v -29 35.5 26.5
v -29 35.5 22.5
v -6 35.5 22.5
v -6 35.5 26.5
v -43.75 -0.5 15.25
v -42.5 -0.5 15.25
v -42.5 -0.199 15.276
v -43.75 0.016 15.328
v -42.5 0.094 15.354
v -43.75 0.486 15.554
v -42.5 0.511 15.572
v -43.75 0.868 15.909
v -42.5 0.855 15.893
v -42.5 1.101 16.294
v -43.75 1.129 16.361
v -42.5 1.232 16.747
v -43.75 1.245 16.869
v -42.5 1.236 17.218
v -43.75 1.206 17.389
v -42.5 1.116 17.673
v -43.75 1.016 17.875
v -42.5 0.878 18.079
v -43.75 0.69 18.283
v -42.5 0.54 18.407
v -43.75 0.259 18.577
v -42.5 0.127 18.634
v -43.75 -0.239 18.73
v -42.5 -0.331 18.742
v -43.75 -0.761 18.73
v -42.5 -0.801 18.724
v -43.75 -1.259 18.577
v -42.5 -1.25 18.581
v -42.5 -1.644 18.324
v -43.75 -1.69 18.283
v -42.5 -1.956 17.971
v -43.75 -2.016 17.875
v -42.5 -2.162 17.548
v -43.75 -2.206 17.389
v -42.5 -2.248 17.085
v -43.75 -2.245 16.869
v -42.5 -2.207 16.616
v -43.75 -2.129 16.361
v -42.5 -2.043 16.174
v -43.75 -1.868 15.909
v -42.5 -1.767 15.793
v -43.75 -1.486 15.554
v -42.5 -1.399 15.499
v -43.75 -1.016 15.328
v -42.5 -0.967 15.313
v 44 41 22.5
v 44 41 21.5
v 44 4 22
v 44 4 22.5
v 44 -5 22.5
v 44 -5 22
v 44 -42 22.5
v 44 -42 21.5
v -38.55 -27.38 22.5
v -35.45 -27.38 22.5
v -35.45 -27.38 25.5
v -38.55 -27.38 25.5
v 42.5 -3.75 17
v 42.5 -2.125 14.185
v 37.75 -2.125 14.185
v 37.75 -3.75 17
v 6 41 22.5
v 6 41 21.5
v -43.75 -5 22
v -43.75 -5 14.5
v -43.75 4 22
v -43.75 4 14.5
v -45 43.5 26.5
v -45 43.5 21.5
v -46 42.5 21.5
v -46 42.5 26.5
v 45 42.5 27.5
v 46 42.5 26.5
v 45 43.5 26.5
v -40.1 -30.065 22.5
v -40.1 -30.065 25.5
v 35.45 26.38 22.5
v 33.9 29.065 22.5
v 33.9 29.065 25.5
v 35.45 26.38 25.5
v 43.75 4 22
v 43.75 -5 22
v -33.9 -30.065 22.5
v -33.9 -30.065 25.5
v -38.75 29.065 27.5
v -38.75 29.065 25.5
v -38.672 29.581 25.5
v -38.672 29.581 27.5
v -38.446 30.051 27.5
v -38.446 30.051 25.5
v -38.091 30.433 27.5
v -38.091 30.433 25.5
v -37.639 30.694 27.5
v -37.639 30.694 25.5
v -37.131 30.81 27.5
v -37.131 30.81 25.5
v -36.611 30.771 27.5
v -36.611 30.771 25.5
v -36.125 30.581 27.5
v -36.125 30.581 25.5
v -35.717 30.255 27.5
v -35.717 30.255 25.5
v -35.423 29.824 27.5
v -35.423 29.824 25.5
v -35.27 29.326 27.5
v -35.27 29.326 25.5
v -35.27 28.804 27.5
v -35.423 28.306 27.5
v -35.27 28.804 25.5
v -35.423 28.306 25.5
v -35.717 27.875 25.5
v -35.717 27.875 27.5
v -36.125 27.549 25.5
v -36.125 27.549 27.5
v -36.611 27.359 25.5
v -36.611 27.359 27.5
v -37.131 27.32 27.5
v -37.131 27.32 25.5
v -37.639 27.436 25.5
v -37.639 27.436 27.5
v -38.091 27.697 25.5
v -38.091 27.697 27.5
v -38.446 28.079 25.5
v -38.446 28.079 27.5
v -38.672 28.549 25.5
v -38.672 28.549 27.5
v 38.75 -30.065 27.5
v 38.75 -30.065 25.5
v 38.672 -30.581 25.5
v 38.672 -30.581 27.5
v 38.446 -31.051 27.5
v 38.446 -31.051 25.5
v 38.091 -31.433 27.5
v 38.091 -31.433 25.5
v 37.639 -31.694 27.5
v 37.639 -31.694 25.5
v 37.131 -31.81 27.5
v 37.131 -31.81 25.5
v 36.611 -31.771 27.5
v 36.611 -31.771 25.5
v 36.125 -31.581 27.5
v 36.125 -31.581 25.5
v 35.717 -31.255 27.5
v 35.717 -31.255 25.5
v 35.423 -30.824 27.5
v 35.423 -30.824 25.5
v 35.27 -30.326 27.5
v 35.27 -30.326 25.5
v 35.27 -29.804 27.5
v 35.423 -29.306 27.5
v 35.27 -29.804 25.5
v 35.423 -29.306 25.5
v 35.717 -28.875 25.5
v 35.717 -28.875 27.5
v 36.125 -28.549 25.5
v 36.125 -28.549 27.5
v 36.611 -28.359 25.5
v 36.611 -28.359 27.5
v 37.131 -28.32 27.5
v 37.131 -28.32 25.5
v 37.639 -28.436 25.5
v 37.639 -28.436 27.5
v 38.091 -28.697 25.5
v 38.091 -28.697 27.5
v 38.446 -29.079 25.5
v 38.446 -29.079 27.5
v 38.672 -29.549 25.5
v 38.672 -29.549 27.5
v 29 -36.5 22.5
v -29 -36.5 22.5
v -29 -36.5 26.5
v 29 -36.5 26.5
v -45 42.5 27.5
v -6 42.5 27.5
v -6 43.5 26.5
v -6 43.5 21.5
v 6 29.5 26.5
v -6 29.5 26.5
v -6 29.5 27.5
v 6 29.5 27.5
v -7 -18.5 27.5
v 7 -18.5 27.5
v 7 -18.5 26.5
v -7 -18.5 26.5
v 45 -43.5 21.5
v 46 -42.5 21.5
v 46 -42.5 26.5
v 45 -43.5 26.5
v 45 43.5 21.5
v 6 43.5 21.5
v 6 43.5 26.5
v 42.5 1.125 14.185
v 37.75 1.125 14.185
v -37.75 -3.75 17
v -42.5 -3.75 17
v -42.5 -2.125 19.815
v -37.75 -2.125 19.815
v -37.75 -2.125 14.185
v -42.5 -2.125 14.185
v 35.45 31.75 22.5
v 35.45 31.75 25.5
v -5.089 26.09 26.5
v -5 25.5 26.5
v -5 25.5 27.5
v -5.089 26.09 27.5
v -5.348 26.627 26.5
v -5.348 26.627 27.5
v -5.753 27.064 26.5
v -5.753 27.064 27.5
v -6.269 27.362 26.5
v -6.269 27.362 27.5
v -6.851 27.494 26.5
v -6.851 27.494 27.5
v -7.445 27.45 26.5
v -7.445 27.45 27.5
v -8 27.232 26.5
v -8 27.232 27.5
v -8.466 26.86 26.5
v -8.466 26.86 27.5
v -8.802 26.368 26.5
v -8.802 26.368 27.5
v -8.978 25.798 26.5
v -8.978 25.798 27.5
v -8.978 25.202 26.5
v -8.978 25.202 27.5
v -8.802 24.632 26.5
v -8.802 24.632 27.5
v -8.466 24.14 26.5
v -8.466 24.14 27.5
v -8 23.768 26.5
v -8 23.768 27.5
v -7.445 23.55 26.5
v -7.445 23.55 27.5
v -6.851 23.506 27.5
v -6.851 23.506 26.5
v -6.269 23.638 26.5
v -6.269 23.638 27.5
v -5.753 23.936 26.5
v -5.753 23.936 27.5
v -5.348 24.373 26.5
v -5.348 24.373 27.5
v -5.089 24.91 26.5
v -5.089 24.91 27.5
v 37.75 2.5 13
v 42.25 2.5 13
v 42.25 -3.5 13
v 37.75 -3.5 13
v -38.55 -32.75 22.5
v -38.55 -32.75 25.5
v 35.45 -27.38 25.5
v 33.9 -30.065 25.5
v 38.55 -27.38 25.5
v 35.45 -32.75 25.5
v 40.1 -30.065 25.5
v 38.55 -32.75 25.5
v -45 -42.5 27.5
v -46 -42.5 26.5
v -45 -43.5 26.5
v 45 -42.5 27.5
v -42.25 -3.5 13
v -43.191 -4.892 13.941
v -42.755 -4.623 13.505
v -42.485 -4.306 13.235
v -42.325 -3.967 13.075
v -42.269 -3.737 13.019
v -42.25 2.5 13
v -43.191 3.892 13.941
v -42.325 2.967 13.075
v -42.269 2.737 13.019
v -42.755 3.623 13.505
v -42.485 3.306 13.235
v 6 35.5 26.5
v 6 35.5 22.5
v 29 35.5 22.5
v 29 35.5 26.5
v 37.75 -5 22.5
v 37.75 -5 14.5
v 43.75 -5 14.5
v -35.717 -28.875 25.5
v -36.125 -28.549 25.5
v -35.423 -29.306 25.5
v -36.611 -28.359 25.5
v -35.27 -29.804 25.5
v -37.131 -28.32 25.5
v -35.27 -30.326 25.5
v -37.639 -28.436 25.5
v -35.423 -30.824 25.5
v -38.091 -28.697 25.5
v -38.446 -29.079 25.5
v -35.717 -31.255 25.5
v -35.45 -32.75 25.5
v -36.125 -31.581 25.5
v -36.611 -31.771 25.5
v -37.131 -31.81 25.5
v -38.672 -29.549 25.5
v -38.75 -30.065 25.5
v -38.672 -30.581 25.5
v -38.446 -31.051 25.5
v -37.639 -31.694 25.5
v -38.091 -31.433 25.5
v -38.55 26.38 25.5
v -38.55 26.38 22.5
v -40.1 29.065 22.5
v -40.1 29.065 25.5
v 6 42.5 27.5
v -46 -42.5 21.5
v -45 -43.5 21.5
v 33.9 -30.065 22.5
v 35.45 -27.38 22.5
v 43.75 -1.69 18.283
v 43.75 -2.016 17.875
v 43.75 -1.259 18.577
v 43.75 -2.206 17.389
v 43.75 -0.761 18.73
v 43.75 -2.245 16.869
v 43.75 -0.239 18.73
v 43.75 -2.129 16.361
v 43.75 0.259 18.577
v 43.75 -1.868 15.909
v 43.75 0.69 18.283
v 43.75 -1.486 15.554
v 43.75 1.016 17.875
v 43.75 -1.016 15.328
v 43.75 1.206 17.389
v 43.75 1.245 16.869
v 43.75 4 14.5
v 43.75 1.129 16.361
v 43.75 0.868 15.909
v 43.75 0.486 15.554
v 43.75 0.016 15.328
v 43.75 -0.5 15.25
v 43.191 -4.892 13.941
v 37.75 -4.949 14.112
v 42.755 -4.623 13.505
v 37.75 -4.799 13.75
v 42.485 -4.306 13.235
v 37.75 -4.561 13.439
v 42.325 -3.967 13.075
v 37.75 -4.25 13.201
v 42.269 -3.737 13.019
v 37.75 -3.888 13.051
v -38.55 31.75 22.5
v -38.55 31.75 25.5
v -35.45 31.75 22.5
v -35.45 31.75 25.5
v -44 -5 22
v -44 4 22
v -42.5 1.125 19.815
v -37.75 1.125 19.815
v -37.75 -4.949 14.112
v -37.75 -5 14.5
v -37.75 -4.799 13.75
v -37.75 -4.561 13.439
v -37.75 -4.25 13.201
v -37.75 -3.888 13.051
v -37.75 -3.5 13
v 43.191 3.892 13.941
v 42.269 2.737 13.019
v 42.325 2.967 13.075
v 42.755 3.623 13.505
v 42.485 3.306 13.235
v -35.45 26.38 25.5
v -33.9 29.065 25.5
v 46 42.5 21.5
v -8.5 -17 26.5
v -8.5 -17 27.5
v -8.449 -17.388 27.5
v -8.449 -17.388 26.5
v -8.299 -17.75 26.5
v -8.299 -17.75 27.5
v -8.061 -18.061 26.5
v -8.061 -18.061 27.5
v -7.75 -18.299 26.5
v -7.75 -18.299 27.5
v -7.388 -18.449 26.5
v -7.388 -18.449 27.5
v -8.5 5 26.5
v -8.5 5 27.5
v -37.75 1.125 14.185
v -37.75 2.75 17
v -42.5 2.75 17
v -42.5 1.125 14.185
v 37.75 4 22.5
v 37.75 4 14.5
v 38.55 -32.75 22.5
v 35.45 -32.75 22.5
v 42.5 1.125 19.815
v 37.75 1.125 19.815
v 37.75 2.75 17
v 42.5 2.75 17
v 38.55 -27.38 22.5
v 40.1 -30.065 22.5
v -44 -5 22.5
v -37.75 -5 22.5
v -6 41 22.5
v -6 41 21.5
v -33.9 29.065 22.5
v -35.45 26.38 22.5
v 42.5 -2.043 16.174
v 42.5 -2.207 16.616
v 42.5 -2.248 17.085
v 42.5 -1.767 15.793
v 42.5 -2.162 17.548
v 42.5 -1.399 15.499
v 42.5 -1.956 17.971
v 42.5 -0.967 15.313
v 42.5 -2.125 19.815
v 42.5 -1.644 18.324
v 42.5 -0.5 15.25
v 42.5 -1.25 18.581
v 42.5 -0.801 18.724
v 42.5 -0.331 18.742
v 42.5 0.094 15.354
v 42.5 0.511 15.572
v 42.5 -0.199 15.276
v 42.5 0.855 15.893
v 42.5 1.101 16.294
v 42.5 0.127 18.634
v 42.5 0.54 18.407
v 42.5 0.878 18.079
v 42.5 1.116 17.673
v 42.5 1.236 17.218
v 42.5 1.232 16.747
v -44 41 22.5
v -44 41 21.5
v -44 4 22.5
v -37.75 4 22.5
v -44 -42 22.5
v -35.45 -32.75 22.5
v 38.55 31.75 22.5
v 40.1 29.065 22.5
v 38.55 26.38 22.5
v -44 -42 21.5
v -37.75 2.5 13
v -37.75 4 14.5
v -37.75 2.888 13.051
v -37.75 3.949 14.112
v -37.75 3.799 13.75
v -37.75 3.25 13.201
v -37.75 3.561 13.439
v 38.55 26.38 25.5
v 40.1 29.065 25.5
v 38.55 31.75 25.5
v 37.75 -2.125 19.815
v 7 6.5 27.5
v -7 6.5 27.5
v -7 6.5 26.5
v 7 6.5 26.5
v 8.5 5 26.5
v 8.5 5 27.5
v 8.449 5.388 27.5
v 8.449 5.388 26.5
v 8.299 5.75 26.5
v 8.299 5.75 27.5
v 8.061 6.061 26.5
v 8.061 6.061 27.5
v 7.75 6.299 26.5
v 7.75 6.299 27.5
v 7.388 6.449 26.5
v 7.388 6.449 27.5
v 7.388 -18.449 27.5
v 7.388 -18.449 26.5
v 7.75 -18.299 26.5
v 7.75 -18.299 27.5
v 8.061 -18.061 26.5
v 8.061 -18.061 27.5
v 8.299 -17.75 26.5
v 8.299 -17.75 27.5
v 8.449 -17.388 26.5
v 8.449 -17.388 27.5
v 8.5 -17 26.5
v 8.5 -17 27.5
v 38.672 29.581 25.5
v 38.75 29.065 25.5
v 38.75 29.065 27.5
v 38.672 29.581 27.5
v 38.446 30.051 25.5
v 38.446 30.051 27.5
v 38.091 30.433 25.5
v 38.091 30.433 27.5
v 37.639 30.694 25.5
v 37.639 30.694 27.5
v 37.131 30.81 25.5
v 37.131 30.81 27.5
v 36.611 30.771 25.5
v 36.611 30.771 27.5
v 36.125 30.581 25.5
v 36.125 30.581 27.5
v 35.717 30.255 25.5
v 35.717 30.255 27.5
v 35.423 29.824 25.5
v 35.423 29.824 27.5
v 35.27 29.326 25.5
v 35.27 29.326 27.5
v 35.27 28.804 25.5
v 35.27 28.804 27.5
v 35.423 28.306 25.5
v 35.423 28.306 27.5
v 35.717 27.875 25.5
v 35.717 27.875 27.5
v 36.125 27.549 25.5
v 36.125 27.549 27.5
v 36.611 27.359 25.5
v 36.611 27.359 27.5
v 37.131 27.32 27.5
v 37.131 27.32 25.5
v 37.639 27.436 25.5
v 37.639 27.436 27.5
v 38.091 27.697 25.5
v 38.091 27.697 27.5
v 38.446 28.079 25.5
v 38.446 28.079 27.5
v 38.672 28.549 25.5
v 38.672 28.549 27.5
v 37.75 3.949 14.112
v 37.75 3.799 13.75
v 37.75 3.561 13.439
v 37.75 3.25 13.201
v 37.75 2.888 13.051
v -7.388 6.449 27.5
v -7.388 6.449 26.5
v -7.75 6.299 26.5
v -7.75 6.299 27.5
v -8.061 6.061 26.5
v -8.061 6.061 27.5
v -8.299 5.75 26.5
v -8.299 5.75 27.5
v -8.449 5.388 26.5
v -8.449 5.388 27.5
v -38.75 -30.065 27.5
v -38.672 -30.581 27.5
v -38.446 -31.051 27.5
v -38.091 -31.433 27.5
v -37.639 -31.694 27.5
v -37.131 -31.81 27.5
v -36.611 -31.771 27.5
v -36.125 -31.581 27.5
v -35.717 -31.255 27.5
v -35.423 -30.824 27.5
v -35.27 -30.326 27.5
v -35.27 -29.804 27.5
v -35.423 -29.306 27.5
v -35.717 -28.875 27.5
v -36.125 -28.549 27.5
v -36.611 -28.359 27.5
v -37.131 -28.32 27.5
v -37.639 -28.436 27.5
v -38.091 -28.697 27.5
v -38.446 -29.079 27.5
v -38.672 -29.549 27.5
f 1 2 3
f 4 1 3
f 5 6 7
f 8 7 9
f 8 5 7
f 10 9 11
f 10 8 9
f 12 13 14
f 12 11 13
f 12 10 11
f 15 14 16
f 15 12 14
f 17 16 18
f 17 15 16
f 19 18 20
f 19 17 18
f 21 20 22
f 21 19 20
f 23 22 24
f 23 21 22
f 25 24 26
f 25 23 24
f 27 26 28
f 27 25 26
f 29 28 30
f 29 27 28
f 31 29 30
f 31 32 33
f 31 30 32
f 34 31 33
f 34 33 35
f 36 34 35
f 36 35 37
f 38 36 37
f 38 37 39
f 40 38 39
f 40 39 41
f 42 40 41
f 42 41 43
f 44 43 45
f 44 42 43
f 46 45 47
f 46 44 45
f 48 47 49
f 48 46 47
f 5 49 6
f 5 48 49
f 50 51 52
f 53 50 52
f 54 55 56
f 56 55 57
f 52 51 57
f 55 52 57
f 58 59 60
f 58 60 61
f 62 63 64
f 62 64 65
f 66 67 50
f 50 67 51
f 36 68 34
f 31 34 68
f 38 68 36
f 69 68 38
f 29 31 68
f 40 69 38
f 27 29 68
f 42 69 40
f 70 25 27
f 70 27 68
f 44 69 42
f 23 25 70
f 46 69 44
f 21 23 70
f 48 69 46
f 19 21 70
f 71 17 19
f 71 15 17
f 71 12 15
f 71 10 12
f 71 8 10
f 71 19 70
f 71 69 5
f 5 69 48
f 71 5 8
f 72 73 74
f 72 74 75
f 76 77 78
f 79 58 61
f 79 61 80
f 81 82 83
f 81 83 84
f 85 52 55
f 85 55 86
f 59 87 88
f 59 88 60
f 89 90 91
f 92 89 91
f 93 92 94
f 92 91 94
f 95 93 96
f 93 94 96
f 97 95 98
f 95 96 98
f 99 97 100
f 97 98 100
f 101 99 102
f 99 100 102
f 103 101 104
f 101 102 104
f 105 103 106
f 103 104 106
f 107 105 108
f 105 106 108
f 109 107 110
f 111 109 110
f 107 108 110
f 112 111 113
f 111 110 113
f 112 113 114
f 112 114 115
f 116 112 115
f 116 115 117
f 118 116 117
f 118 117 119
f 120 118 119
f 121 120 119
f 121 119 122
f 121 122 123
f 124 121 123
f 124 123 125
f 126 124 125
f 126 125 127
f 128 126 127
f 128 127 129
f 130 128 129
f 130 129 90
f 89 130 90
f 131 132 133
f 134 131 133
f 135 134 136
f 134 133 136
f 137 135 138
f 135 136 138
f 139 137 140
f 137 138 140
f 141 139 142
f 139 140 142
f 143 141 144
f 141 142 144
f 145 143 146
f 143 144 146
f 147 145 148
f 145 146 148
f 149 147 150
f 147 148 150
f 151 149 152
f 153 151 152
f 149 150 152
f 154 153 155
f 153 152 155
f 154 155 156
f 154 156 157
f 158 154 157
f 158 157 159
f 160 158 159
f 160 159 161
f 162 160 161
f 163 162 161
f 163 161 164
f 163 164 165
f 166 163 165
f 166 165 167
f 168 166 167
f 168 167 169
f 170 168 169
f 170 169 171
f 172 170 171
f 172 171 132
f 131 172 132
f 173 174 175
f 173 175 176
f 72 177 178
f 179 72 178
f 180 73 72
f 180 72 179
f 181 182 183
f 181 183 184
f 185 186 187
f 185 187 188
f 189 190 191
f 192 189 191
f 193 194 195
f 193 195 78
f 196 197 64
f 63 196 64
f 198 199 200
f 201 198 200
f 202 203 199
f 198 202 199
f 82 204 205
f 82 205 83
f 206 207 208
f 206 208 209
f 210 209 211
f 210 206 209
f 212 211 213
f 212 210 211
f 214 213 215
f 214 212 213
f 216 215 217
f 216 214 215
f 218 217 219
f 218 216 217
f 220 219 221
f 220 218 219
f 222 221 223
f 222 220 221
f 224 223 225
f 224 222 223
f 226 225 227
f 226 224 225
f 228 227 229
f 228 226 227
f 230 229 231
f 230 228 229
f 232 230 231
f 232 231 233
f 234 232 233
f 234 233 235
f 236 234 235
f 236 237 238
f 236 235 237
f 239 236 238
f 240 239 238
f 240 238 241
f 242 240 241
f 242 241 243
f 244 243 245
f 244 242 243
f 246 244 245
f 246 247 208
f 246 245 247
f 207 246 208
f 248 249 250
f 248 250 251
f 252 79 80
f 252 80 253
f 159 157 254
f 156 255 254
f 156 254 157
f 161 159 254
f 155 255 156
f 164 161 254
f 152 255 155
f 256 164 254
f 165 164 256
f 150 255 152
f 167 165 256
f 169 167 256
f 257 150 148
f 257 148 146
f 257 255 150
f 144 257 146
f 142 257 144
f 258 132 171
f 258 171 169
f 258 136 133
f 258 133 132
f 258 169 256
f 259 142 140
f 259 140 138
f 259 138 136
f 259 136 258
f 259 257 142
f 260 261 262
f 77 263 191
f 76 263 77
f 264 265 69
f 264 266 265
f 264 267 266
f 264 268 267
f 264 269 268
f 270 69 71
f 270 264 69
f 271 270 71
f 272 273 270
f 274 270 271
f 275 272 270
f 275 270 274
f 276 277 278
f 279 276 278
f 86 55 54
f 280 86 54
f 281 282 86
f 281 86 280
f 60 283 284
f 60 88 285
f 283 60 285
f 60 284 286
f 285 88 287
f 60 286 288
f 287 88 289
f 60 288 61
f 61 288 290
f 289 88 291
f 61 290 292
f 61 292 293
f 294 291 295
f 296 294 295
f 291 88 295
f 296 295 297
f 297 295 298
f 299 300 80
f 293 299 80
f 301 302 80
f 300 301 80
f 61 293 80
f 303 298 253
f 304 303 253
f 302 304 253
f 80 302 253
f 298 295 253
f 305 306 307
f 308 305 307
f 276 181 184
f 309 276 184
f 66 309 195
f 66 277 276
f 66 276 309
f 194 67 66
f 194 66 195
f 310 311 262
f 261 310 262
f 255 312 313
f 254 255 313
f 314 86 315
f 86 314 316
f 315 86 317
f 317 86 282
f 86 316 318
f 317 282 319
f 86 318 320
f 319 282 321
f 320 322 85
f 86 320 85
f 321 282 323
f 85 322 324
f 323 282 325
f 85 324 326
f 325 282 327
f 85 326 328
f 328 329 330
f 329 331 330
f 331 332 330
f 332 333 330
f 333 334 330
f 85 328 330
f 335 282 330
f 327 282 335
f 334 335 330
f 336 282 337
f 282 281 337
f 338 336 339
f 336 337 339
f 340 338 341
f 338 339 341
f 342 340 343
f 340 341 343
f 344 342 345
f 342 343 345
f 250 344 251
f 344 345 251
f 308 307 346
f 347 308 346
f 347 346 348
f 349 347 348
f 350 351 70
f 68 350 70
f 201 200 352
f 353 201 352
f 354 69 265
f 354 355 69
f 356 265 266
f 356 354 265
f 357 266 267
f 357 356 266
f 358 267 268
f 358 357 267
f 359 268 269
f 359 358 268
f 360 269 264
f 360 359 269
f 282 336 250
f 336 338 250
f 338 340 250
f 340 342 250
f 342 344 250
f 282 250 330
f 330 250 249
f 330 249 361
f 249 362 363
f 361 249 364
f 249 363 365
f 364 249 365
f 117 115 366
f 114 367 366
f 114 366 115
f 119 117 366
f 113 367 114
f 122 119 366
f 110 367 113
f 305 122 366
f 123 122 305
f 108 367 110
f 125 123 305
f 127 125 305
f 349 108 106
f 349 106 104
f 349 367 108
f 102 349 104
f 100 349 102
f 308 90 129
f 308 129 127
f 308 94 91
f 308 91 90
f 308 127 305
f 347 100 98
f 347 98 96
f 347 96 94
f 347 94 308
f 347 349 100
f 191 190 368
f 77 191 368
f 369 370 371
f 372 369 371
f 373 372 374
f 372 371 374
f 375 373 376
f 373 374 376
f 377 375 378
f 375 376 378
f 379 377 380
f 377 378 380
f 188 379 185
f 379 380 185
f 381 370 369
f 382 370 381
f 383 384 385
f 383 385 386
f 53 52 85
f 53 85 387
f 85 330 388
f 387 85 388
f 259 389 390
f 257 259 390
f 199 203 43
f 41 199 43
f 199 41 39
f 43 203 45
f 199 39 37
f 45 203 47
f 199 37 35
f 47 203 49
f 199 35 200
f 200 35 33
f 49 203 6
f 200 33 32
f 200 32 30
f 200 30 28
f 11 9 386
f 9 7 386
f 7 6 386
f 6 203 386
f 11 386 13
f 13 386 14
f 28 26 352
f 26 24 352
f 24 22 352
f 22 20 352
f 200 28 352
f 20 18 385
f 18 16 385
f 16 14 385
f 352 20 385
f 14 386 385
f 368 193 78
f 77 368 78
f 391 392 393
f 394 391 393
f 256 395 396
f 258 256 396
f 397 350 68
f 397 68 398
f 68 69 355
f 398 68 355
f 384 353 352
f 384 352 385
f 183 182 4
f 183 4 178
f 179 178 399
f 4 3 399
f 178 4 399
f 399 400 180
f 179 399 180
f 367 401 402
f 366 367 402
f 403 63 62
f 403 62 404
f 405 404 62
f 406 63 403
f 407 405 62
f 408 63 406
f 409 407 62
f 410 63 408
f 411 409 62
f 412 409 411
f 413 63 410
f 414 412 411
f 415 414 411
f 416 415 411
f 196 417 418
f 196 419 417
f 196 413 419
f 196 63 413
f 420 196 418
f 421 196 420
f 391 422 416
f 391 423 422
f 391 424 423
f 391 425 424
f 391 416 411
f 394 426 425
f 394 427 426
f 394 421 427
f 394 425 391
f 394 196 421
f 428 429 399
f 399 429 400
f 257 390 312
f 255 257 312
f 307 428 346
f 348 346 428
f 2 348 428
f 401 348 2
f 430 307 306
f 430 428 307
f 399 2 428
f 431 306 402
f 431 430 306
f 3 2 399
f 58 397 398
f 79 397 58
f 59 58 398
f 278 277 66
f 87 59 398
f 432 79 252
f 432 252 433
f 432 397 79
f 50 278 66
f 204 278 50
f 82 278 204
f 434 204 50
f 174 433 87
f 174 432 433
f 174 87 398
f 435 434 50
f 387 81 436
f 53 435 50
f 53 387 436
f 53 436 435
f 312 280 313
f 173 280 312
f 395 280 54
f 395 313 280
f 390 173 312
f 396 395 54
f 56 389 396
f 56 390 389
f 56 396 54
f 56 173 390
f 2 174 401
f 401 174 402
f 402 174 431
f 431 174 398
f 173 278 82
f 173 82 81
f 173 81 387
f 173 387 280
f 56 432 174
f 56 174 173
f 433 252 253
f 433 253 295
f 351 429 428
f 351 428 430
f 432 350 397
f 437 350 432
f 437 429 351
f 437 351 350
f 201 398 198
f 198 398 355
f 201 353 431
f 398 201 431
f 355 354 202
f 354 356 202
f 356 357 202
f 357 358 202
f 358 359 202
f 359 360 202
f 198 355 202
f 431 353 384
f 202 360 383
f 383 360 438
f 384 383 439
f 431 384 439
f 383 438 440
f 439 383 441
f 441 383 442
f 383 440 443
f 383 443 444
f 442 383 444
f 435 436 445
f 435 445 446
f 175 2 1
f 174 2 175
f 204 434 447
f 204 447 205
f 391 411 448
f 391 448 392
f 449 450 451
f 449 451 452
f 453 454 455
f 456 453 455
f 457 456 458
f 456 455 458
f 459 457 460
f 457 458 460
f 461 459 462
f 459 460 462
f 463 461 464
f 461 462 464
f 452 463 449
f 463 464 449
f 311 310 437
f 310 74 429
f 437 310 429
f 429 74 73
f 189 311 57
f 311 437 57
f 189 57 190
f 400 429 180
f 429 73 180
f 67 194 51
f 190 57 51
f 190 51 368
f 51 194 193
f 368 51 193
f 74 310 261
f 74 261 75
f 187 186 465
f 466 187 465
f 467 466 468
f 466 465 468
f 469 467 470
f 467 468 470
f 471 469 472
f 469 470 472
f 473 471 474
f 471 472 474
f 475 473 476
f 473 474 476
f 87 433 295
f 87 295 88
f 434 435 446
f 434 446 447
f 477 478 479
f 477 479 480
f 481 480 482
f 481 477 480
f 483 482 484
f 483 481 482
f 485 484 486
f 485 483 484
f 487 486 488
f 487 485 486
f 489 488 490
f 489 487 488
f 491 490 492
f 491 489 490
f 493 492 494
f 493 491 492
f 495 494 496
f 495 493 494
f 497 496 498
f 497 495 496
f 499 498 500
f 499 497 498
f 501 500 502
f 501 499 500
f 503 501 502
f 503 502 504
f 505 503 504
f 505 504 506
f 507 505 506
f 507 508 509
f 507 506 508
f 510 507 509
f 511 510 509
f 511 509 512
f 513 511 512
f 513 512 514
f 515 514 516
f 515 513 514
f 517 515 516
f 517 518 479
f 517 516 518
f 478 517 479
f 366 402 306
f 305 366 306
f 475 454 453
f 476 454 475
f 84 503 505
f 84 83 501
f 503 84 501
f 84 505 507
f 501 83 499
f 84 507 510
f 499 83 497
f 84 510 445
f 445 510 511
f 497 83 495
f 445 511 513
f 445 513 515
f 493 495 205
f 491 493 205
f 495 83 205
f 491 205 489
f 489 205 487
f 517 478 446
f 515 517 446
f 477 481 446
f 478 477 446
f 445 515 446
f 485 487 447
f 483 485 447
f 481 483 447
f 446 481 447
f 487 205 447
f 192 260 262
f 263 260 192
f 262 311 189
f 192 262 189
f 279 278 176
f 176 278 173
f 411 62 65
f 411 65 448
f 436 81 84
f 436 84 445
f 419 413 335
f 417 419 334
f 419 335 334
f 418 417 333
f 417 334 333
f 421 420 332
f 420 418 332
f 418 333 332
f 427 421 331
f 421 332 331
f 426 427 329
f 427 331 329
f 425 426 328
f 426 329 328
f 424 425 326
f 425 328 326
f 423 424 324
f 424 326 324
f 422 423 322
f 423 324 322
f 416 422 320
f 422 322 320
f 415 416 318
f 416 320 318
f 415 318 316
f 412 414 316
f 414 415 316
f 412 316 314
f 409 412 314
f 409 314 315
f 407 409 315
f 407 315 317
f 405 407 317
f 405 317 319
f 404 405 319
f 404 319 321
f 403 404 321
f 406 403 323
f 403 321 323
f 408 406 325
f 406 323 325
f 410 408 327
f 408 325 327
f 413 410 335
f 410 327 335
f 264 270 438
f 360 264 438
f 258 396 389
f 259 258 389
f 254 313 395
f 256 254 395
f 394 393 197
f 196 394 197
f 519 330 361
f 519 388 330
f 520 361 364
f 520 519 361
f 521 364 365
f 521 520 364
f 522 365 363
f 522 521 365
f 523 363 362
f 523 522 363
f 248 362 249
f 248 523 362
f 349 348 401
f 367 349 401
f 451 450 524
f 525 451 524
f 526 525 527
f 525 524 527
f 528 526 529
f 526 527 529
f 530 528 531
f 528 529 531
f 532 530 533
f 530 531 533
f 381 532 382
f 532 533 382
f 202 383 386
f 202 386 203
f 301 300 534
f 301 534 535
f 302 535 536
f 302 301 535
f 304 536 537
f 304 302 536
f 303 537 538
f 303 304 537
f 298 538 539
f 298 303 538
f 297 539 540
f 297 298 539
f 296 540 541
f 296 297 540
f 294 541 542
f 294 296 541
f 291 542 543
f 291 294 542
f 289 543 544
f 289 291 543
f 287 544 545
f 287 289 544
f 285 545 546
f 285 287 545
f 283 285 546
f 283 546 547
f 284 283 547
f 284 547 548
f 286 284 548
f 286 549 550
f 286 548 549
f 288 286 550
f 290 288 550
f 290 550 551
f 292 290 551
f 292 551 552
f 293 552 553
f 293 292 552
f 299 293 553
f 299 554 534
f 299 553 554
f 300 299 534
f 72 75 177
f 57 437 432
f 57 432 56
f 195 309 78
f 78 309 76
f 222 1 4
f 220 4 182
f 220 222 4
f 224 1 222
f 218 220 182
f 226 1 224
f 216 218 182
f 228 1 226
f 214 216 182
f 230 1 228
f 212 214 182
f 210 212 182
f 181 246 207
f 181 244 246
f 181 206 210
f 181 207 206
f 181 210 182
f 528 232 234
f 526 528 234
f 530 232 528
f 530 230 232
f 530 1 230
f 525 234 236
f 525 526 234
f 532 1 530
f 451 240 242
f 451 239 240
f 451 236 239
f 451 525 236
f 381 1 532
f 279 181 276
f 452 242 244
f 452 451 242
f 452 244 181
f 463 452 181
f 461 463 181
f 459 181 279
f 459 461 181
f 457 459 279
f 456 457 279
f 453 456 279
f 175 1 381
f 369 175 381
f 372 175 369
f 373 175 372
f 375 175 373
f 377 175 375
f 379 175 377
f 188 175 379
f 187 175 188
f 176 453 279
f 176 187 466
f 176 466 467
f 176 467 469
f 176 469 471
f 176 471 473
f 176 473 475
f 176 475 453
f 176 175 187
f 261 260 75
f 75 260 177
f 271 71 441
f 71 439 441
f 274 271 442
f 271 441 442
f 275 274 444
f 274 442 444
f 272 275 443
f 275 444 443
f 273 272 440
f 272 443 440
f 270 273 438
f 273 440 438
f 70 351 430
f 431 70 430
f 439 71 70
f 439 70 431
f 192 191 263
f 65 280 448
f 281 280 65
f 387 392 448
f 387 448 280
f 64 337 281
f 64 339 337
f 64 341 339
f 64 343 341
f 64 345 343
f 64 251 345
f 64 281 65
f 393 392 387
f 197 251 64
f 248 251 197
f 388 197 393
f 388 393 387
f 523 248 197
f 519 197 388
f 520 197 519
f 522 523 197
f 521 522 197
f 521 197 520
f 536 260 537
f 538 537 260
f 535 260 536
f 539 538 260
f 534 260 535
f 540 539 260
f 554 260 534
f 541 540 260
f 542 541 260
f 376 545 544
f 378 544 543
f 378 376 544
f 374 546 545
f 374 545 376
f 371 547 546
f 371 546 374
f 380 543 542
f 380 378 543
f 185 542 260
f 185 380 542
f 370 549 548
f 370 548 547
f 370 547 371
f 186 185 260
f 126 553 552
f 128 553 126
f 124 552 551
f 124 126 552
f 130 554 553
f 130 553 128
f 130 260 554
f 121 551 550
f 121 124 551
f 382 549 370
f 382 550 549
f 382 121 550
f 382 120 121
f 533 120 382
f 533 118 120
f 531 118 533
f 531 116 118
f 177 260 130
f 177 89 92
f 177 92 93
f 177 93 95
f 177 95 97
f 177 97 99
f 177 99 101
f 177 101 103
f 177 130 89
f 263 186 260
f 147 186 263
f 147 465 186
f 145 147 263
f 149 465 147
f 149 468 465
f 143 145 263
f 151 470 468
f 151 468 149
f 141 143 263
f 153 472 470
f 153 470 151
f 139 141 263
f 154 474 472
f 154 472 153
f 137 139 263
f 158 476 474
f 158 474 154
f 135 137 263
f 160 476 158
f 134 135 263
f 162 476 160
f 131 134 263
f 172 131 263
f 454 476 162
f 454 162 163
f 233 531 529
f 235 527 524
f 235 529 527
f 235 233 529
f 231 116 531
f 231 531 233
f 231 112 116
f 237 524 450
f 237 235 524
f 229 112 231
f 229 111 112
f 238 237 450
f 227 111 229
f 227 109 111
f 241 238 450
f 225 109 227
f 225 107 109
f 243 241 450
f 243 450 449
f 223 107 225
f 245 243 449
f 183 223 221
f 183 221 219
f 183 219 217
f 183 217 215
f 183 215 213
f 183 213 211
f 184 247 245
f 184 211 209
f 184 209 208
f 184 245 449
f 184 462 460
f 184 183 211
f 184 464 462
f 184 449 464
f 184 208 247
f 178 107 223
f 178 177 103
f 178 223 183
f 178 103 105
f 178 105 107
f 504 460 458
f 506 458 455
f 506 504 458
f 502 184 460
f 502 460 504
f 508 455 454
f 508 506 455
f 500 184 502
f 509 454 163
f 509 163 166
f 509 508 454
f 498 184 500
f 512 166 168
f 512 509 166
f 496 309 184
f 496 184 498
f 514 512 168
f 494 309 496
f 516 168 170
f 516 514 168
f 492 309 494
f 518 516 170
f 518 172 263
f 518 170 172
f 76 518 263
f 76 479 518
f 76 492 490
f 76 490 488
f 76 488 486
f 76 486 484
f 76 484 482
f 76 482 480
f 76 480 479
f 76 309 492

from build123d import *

# Parameters (mm, degrees)
BOX023_W                 = 4
BOX023_H                 = 9
BOX023_DEPTH             = 3
PRISM015_DEPTH           = 10
PRISM015_ROLL_ANGLE      = -90.000052
PRISM015_PITCH_ANGLE     = -59.999967
PRISM015_PLACEMENT_ANGLE = 90.000052
CYLINDER032_R            = 1.75
CYLINDER032_DEPTH        = 68
CYLINDER032_PITCH_ANGLE  = 90
BOX022_W                 = 6
BOX022_H                 = 9
BOX022_DEPTH             = 11
CHAMFER020_SIZE          = 1.5
FILLET015_R              = 1.5
BOX021_W                 = 12
BOX021_H                 = 16
BOX021_DEPTH             = 10
CYLINDER033_R            = 2
CYLINDER033_DEPTH        = 15
PAD035009_DEPTH          = 35
CYLINDER034_R            = 1.75
CYLINDER034_DEPTH        = 50
PRISM012_DEPTH           = 10
SKETCH031_W              = 88
SKETCH031_H              = 83
PAD035007_DEPTH          = 2
SKETCH032_W              = 58
SKETCH032_H              = 72
PAD035008_DEPTH          = 6
BOX020_W                 = 92
BOX020_H                 = 87
BOX020_DEPTH             = 6
CHAMFER019_SIZE          = 1


with BuildPart() as cubo022:
    # Box023 → Box023 (new body)
    with BuildSketch(Plane(origin=(-29.75, -4.5, 23), x_dir=(1, 0, 0), z_dir=(0, 0, 1))):
        with Locations((2, 4.5)):
            Rectangle(BOX023_W, BOX023_H)
    extrude(amount=BOX023_DEPTH)


with BuildPart() as prisma015:
    # Prism015 → Prism015 (new body)
    with BuildSketch(Plane.XY):
        Polygon((3.25, 0), (1.625, 2.814583), (-1.625, 2.814583), (-3.25, 0), (-1.625, -2.814583), (1.625, -2.814583), align=None)
    extrude(amount=PRISM015_DEPTH)


with BuildPart() as prisma015_1:
    # Prism015 roll: moved
    add(prisma015.part.rotate(Axis((0, 0, 0), (1, 0, 0)), PRISM015_ROLL_ANGLE))


with BuildPart() as prisma015_2:
    # Prism015 pitch: moved
    add(prisma015_1.part.rotate(Axis((0, 0, 0), (0, 1, 0)), PRISM015_PITCH_ANGLE))


with BuildPart() as prisma015_3:
    # Prism015 placement: moved
    add(prisma015_2.part.moved(Location((-17.5, 0, 18))).rotate(Axis((-17.5, 0, 18), (0, 0, 1)), PRISM015_PLACEMENT_ANGLE))


with BuildPart() as cilindro027:
    # Cylinder032 → Cylinder032 (new body)
    with BuildSketch(Plane.XY):
        Circle(CYLINDER032_R)
    extrude(amount=CYLINDER032_DEPTH)


with BuildPart() as cilindro027_1:
    # Cylinder032 pitch: moved
    add(cilindro027.part.rotate(Axis((0, 0, 0), (0, 1, 0)), CYLINDER032_PITCH_ANGLE))


with BuildPart() as cilindro027_2:
    # Cylinder032 placement: moved
    add(cilindro027_1.part.moved(Location((-34, 0, 18))))


with BuildPart() as fusion039:
    # Box022 → Box022 (new body)
    with BuildSketch(Plane(origin=(-28.75, -4.5, 14), x_dir=(1, 0, 0), z_dir=(0, 0, 1))):
        with Locations((3, 4.5)):
            Rectangle(BOX022_W, BOX022_H)
    extrude(amount=BOX022_DEPTH)

    # Cut050: cut Cilindro027
    add(cilindro027_2.part, mode=Mode.SUBTRACT)

    # Chamfer020
    chamfer020_edges = [fusion039.edges().sort_by_distance(p)[0] for p in [
        (-28.75, 0, 14),
    ]]
    chamfer(chamfer020_edges, length=CHAMFER020_SIZE)

    # Fillet015
    fillet015_edges = [fusion039.edges().sort_by_distance(p)[0] for p in [
        (-25, -4.5, 14),
        (-25, 4.5, 14),
    ]]
    fillet(fillet015_edges, radius=FILLET015_R)

    # Cut051: cut Prisma015
    add(prisma015_3.part, mode=Mode.SUBTRACT)

    # Fusion039: union Cubo022
    add(cubo022.part)


with BuildPart() as fusion039_1:
    # Fusion039 placement: moved
    add(fusion039.part.moved(Location((-15, -0.5, -1))))


with BuildPart() as fusion044:
    # Part__Mirroring048: instance of Fusion039
    add(fusion039_1.part.mirror(Plane(origin=(0, 0, 0), x_dir=(0, -1, 0), z_dir=(1, 0, 0))))

    # Fusion044: union Fusion039
    add(fusion039_1.part)


with BuildPart() as fusion044_1:
    # Fusion044 placement: moved
    add(fusion044.part.moved(Location((0, 0, 1.5))))


with BuildPart() as back_cover_hole:
    # Box021 → Box021 (new body)
    with BuildSketch(Plane(origin=(-6, 30, 22), x_dir=(1, 0, 0), z_dir=(0, 0, 1))):
        with Locations((6, 8)):
            Rectangle(BOX021_W, BOX021_H)
    extrude(amount=BOX021_DEPTH)


with BuildPart() as fusion043:
    # Cylinder033 → Cylinder033 (new body)
    with BuildSketch(Plane(origin=(-7, 26, 17), x_dir=(1, 0, 0), z_dir=(0, 0, 1))):
        Circle(CYLINDER033_R)
    extrude(amount=CYLINDER033_DEPTH)

    # Fusion043: union back_cover_hole
    add(back_cover_hole.part)


with BuildPart() as hole_cover:
    # Sketch033 → Pad035009 (new body)
    with BuildSketch(Plane.XY.offset(40)):
        with BuildLine():
            Line((-7, 7), (7, 7))
            ThreePointArc((8.5, 5.5), (8.06066, 6.56066), (7, 7))
            Line((8.5, 5.5), (8.5, -16.5))
            ThreePointArc((7, -18), (8.06066, -17.56066), (8.5, -16.5))
            Line((7, -18), (-7, -18))
            ThreePointArc((-8.5, -16.5), (-8.06066, -17.56066), (-7, -18))
            Line((-8.5, -16.5), (-8.5, 5.5))
            ThreePointArc((-7, 7), (-8.06066, 6.56066), (-8.5, 5.5))
        make_face()
    extrude(amount=-PAD035009_DEPTH)


with BuildPart() as cilindro:
    # Cylinder034 → Cylinder034 (new body)
    with BuildSketch(Plane.XY.offset(-15)):
        Circle(CYLINDER034_R)
    extrude(amount=CYLINDER034_DEPTH)


with BuildPart() as screw_nut_hole:
    # Prism012 → Prism012 (new body)
    with BuildSketch(Plane.XY):
        Polygon((3.1, 0), (1.55, 2.684679), (-1.55, 2.684679), (-3.1, 0), (-1.55, -2.684679), (1.55, -2.684679), align=None)
    extrude(amount=PRISM012_DEPTH)

    # Fusion041: union Cilindro
    add(cilindro.part)


with BuildPart() as screw_nut_hole_1:
    # Fusion041 placement: moved
    add(screw_nut_hole.part.moved(Location((37, 29.565, 9.5))))


with BuildPart() as part_mirroring049:
    # Part__Mirroring049: instance of screw_nut_hole
    add(screw_nut_hole_1.part.mirror(Plane(origin=(0, 0, 0), x_dir=(0, -1, 0), z_dir=(1, 0, 0))))


with BuildPart() as part_mirroring050:
    # Part__Mirroring050: instance of Part__Mirroring049
    add(part_mirroring049.part.mirror(Plane(origin=(0, 0, 0), x_dir=(1, 0, 0), z_dir=(0, 1, 0))))


with BuildPart() as screw_nuts_holes:
    # Part__Mirroring051: instance of screw_nut_hole
    add(screw_nut_hole_1.part.mirror(Plane(origin=(0, 0, 0), x_dir=(1, 0, 0), z_dir=(0, 1, 0))))

    # Fusion042: union screw_nut_hole, Part__Mirroring049, Part__Mirroring050
    add(screw_nut_hole_1.part)
    add(part_mirroring049.part)
    add(part_mirroring050.part)


with BuildPart() as screw_nuts_holes_1:
    # Fusion042 placement: moved
    add(screw_nuts_holes.part.moved(Location((0, 0, 7.5))))


with BuildPart() as pad035007:
    # Sketch031 → Pad035007 (new body)
    with BuildSketch(Plane(origin=(0, 0, 23), x_dir=(1, 0, 0), z_dir=(0, 0, -1))):
        Rectangle(SKETCH031_W, SKETCH031_H)
    extrude(amount=-PAD035007_DEPTH)


with BuildPart() as down_cover_base:
    # Sketch032 → Pad035008 (new body)
    with BuildSketch(Plane(origin=(0, 0, 23), x_dir=(1, 0, 0), z_dir=(0, 0, -1))):
        Rectangle(SKETCH032_W, SKETCH032_H)
    extrude(amount=-PAD035008_DEPTH)

    # Fusion037: union Pad035007
    add(pad035007.part)


with BuildPart() as down_cover_base_1:
    # Fusion037 placement: moved
    add(down_cover_base.part.moved(Location((0, 0, -1))))


with BuildPart() as cover:
    # Box020 → Box020 (new body)
    with BuildSketch(Plane(origin=(-46, -43, 23), x_dir=(1, 0, 0), z_dir=(0, 0, 1))):
        with Locations((46, 43.5)):
            Rectangle(BOX020_W, BOX020_H)
    extrude(amount=BOX020_DEPTH)

    # Chamfer019
    chamfer019_edges = [cover.edges().sort_by_distance(p)[0] for p in [
        (-46, -43, 26),
        (-46, 0.5, 29),
        (-46, 44, 26),
        (46, -43, 26),
        (46, 0.5, 29),
        (46, 44, 26),
        (0, -43, 29),
        (0, 44, 29),
    ]]
    chamfer(chamfer019_edges, length=CHAMFER019_SIZE)

    # Cut052: cut down_cover_base
    add(down_cover_base_1.part, mode=Mode.SUBTRACT)

    # Cut053: cut screw_nuts_holes
    add(screw_nuts_holes_1.part, mode=Mode.SUBTRACT)

    # Cut054: cut hole_cover
    add(hole_cover.part, mode=Mode.SUBTRACT)

    # Cut055: cut Fusion043
    add(fusion043.part, mode=Mode.SUBTRACT)


with BuildPart() as cover_1:
    # Cut055 placement: moved
    add(cover.part.moved(Location((0, -0.5, 0))))

    # Fusion045: union Fusion044
    add(fusion044_1.part)


with BuildPart() as cover_2:
    # Fusion045 placement: moved
    add(cover_1.part.moved(Location((0, 0, -1.5))))


solid = cover_2.part
